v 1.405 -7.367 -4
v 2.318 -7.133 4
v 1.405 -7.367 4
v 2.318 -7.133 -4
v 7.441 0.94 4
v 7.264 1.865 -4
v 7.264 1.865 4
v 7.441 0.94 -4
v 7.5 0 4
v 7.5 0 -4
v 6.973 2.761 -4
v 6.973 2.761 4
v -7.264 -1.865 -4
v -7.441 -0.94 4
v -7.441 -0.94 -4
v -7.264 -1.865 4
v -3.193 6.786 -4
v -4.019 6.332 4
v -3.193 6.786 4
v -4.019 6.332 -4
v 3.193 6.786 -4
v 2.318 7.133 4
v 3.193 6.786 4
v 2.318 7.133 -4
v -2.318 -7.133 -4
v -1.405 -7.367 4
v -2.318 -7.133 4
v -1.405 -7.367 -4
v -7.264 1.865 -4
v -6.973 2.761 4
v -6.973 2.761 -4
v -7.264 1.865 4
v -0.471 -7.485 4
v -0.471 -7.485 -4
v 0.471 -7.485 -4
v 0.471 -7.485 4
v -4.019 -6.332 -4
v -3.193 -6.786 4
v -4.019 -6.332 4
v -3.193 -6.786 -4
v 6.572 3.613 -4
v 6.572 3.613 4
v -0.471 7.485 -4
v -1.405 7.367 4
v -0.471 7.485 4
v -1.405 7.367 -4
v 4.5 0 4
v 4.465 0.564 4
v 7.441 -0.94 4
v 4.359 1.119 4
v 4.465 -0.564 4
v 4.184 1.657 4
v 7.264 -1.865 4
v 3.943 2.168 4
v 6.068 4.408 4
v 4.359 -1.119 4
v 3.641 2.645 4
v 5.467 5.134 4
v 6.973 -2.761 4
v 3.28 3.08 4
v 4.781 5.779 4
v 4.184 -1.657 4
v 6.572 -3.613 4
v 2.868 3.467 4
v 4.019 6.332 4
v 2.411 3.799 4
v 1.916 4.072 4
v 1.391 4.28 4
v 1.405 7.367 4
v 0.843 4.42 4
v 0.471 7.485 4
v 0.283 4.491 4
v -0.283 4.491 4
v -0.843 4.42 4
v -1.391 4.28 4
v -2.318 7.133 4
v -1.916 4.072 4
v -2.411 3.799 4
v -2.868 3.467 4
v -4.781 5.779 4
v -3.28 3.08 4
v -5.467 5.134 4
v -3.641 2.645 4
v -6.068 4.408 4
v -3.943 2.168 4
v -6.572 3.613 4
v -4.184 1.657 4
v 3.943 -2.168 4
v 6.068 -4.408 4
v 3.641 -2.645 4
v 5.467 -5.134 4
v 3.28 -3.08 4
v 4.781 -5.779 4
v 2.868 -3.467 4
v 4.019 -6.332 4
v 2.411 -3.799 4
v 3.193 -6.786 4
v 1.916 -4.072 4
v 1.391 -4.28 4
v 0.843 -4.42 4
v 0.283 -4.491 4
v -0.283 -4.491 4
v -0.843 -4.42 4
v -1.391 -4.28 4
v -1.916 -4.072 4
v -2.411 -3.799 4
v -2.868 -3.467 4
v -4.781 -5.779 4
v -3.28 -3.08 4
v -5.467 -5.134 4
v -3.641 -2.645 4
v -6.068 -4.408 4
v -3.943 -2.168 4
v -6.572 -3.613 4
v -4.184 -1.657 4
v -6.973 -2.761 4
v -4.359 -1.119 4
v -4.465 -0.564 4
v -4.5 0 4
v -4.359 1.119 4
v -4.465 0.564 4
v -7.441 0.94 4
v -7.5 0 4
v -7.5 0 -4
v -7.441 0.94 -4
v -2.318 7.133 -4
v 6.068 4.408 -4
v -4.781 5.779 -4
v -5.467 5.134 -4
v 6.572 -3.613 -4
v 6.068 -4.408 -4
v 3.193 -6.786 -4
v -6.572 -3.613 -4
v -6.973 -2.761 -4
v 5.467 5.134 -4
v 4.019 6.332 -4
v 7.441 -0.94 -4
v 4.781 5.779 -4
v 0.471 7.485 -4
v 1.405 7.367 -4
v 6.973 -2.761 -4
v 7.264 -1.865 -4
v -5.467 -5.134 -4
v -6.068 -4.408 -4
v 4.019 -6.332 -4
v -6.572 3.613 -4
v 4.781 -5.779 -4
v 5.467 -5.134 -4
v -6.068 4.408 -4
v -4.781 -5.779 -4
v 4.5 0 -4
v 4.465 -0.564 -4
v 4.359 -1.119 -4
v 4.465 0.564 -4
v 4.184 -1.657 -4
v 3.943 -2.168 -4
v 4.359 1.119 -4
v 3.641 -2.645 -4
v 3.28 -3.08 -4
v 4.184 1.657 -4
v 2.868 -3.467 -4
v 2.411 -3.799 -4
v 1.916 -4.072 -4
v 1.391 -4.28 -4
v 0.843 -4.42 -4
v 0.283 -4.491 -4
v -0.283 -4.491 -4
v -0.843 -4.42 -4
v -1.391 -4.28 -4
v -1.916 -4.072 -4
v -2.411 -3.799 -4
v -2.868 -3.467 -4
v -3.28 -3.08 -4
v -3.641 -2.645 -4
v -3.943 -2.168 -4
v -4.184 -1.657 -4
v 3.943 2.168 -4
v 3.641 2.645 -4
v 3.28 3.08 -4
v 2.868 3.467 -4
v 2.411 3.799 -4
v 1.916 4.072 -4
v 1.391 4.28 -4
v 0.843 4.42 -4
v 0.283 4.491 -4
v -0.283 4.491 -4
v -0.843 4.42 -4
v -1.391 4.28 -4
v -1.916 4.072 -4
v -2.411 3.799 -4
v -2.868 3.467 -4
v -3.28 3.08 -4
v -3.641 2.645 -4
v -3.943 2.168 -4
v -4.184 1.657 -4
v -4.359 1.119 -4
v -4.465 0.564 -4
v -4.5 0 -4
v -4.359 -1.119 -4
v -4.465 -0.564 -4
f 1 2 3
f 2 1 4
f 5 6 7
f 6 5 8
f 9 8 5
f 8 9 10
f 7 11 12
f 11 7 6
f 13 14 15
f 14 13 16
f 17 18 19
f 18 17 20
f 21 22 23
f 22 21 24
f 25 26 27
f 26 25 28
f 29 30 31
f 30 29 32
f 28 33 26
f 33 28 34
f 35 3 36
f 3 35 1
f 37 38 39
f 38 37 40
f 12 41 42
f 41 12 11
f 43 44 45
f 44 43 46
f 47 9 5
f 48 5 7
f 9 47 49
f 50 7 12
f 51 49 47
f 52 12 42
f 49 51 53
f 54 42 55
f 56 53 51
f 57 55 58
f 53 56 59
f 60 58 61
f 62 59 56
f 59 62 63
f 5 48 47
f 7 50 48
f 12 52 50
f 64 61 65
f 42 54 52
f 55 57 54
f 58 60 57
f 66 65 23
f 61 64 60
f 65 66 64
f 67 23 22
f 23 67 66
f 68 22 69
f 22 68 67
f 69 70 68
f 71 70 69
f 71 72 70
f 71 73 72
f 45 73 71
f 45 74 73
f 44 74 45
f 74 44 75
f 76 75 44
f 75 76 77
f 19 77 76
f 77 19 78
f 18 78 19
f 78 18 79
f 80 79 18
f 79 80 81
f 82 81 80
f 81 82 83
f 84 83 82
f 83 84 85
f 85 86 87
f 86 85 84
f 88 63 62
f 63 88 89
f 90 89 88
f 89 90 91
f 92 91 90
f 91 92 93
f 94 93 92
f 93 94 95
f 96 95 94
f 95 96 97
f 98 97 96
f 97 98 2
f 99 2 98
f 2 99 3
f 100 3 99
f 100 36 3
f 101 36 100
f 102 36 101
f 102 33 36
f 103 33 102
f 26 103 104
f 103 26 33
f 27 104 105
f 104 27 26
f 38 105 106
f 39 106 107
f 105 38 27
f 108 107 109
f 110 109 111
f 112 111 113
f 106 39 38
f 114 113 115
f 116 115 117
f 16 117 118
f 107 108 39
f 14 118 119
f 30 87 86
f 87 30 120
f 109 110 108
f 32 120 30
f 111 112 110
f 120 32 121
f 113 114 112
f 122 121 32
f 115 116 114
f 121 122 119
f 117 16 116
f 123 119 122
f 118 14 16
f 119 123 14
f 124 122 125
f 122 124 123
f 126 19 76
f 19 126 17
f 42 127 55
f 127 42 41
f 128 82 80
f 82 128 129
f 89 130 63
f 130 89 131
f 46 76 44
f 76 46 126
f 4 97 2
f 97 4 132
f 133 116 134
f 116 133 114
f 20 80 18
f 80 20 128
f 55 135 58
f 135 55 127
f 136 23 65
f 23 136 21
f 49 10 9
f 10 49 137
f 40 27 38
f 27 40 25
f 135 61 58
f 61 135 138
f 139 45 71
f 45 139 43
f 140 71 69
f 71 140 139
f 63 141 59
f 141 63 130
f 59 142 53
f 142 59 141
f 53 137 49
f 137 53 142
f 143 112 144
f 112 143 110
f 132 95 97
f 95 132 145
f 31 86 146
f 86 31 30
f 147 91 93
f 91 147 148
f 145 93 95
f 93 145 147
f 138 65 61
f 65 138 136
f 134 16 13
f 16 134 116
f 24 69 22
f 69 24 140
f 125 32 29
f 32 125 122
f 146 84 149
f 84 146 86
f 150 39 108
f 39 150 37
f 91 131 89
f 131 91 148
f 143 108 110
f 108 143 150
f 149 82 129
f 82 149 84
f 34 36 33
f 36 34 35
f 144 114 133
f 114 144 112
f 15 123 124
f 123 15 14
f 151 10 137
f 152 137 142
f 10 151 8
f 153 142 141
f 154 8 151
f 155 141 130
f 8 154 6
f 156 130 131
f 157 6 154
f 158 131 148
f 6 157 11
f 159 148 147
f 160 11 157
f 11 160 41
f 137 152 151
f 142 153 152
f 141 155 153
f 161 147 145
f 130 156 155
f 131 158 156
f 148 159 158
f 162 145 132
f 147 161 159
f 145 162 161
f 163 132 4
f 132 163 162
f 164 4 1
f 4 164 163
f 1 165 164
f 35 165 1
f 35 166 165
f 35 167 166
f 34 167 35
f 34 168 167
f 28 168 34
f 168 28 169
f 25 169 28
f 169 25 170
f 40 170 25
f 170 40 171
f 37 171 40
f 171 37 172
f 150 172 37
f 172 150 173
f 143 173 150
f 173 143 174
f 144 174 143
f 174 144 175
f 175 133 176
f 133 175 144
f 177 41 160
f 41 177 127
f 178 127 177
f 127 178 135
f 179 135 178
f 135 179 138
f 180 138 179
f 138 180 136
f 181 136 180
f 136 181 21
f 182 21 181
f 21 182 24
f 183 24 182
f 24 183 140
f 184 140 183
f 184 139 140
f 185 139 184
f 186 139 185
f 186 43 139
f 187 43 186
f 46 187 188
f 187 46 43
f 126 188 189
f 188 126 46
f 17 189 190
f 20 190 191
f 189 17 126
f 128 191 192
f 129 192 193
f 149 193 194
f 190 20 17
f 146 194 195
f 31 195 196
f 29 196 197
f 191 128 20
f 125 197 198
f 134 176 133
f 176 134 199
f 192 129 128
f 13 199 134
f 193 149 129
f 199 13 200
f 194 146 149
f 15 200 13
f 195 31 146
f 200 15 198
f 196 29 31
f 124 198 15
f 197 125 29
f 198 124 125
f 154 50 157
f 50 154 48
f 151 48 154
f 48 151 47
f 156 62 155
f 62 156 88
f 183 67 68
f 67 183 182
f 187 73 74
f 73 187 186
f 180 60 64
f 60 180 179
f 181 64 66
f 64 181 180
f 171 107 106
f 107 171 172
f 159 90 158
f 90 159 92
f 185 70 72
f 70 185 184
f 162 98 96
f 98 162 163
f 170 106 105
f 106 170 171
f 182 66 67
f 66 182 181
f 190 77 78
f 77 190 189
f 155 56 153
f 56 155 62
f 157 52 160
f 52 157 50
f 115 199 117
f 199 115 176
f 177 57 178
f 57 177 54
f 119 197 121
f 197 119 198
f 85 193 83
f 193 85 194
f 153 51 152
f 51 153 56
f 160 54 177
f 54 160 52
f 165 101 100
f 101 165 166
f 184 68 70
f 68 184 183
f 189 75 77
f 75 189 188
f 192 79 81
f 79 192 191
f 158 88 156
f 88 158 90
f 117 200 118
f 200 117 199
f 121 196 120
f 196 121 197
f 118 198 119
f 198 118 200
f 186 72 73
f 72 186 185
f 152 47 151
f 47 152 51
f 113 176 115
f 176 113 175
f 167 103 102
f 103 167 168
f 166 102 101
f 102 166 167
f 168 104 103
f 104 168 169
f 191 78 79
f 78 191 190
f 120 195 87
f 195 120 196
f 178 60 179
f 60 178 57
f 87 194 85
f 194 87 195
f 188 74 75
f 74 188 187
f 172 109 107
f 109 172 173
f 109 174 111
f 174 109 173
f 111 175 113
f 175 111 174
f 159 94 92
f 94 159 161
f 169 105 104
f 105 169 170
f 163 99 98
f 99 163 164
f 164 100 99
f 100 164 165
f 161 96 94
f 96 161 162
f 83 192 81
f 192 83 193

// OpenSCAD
$fn = 50;


difference() {
	union() {
		translate(v = [0, 0, -4.0000000000]) {
			cylinder(h = 8, r = 7.5000000000);
		}
	}
	union() {
		translate(v = [0, 0, -100.0000000000]) {
			cylinder(h = 200, r = 4.5000000000);
		}
	}
}
